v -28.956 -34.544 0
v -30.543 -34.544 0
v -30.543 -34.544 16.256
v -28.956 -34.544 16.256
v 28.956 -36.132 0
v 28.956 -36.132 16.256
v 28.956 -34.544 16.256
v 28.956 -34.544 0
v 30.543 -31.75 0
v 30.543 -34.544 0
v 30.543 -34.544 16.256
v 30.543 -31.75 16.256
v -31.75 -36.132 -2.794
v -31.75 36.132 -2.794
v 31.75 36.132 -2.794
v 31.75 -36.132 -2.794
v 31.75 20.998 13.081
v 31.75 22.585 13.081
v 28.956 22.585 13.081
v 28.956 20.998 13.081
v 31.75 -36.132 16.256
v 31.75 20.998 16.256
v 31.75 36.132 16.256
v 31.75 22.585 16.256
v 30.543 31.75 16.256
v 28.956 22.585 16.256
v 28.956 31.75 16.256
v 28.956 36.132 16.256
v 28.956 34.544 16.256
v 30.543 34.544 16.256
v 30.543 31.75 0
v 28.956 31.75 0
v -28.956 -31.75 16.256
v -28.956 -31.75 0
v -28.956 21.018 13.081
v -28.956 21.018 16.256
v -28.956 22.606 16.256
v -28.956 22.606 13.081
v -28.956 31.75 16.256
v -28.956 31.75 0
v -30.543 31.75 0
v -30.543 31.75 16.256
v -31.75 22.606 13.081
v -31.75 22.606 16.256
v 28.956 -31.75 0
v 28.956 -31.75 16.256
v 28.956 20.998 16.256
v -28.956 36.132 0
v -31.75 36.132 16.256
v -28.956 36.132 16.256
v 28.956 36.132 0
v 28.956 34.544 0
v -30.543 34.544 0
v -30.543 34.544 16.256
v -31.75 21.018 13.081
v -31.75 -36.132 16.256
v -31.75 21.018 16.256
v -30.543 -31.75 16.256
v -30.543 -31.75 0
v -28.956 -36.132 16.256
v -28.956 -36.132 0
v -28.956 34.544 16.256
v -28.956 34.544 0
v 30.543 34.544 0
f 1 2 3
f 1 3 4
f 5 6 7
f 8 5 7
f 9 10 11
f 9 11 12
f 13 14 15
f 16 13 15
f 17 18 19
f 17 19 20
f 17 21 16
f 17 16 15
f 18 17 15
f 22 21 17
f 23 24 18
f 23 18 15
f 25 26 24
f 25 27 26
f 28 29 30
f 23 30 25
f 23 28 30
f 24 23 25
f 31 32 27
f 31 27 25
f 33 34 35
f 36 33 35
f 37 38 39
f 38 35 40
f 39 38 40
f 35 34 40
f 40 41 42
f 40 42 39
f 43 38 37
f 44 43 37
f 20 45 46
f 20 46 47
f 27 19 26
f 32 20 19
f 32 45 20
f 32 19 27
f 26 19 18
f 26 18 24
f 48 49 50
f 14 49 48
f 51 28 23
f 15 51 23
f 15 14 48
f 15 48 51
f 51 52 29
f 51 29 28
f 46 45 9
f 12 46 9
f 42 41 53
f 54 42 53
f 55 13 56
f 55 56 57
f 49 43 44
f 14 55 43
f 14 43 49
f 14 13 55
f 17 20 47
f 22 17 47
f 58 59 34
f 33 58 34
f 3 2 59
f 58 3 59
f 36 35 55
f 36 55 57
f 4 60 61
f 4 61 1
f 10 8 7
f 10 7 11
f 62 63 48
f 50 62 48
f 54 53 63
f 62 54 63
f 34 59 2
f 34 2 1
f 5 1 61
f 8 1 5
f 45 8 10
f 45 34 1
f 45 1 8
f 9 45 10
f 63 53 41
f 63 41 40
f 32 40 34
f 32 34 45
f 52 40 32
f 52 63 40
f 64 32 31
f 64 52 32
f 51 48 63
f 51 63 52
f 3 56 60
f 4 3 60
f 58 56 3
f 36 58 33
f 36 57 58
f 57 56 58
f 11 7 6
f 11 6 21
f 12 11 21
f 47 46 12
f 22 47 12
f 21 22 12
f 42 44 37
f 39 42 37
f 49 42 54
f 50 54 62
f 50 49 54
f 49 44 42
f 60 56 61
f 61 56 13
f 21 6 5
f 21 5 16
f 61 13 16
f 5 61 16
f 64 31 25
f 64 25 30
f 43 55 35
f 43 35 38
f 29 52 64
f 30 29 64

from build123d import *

# Parameters (mm, degrees)
F0_W      = 63.5
F0_H      = 72.263
F1_DEPTH  = 2.794
F2_W      = 2.794
F2_H      = 72.263
F3_DEPTH  = 16.256
F4_W      = 1.5875
F4_H      = 2.794
F5_DEPTH  = 16.256
F6_W      = 1.5875
F6_H      = 2.794
F7_DEPTH  = 16.256
F8_W      = 1.5875
F8_H      = 3.175
F9_DEPTH  = 2.794
F10_W     = 1.5875
F10_H     = 3.174931046
F11_DEPTH = 2.794


# Not quite as in the source:
# - a feature names something its author has since deleted; it is built from what else it names


with BuildPart() as f1:
    # F0 (on Top) → F1 (new body)
    with BuildSketch(Plane.XY):
        Rectangle(F0_W, F0_H)
    extrude(amount=-F1_DEPTH)

    # F2 (on face) → F3 (join)
    with BuildSketch(Plane.XY):
        with Locations((-30.353, 0)):
            Rectangle(F2_W, F2_H)
        with Locations((30.353, 0)):
            Rectangle(F2_W, F2_H)
    extrude(amount=F3_DEPTH)

    # F4 (on face) → F5 (cut, through all)
    with BuildSketch(Plane.XY.offset(16.256)):
        with Locations((-29.74975, 33.147)):
            Rectangle(F4_W, F4_H)
        with Locations((-29.74975, -33.147)):
            Rectangle(F4_W, F4_H)
    extrude(amount=-F5_DEPTH, mode=Mode.SUBTRACT)

    # F6 (on face) → F7 (cut, through all)
    with BuildSketch(Plane.XY.offset(16.256)):
        with Locations((29.74975, 33.147)):
            Rectangle(F6_W, F6_H)
        with Locations((29.74975, -33.147)):
            Rectangle(F6_W, F6_H)
    extrude(amount=-F7_DEPTH, mode=Mode.SUBTRACT)

    # F8 (on face) → F9 (cut, through all)
    with BuildSketch(Plane.YZ.offset(-28.956)):
        with Locations((21.81225, 14.6685)):
            Rectangle(F8_W, F8_H)
    extrude(amount=-F9_DEPTH, mode=Mode.SUBTRACT)

    # F10 (on face) → F11 (cut, through all)
    with BuildSketch(Plane(origin=(28.956, 0, 0), x_dir=(0, -1, 0), z_dir=(-1, 0, 0))):
        with Locations((-21.7913250594, 14.668534477)):
            Rectangle(F10_W, F10_H)
    extrude(amount=-F11_DEPTH, mode=Mode.SUBTRACT)


solid = f1.part
